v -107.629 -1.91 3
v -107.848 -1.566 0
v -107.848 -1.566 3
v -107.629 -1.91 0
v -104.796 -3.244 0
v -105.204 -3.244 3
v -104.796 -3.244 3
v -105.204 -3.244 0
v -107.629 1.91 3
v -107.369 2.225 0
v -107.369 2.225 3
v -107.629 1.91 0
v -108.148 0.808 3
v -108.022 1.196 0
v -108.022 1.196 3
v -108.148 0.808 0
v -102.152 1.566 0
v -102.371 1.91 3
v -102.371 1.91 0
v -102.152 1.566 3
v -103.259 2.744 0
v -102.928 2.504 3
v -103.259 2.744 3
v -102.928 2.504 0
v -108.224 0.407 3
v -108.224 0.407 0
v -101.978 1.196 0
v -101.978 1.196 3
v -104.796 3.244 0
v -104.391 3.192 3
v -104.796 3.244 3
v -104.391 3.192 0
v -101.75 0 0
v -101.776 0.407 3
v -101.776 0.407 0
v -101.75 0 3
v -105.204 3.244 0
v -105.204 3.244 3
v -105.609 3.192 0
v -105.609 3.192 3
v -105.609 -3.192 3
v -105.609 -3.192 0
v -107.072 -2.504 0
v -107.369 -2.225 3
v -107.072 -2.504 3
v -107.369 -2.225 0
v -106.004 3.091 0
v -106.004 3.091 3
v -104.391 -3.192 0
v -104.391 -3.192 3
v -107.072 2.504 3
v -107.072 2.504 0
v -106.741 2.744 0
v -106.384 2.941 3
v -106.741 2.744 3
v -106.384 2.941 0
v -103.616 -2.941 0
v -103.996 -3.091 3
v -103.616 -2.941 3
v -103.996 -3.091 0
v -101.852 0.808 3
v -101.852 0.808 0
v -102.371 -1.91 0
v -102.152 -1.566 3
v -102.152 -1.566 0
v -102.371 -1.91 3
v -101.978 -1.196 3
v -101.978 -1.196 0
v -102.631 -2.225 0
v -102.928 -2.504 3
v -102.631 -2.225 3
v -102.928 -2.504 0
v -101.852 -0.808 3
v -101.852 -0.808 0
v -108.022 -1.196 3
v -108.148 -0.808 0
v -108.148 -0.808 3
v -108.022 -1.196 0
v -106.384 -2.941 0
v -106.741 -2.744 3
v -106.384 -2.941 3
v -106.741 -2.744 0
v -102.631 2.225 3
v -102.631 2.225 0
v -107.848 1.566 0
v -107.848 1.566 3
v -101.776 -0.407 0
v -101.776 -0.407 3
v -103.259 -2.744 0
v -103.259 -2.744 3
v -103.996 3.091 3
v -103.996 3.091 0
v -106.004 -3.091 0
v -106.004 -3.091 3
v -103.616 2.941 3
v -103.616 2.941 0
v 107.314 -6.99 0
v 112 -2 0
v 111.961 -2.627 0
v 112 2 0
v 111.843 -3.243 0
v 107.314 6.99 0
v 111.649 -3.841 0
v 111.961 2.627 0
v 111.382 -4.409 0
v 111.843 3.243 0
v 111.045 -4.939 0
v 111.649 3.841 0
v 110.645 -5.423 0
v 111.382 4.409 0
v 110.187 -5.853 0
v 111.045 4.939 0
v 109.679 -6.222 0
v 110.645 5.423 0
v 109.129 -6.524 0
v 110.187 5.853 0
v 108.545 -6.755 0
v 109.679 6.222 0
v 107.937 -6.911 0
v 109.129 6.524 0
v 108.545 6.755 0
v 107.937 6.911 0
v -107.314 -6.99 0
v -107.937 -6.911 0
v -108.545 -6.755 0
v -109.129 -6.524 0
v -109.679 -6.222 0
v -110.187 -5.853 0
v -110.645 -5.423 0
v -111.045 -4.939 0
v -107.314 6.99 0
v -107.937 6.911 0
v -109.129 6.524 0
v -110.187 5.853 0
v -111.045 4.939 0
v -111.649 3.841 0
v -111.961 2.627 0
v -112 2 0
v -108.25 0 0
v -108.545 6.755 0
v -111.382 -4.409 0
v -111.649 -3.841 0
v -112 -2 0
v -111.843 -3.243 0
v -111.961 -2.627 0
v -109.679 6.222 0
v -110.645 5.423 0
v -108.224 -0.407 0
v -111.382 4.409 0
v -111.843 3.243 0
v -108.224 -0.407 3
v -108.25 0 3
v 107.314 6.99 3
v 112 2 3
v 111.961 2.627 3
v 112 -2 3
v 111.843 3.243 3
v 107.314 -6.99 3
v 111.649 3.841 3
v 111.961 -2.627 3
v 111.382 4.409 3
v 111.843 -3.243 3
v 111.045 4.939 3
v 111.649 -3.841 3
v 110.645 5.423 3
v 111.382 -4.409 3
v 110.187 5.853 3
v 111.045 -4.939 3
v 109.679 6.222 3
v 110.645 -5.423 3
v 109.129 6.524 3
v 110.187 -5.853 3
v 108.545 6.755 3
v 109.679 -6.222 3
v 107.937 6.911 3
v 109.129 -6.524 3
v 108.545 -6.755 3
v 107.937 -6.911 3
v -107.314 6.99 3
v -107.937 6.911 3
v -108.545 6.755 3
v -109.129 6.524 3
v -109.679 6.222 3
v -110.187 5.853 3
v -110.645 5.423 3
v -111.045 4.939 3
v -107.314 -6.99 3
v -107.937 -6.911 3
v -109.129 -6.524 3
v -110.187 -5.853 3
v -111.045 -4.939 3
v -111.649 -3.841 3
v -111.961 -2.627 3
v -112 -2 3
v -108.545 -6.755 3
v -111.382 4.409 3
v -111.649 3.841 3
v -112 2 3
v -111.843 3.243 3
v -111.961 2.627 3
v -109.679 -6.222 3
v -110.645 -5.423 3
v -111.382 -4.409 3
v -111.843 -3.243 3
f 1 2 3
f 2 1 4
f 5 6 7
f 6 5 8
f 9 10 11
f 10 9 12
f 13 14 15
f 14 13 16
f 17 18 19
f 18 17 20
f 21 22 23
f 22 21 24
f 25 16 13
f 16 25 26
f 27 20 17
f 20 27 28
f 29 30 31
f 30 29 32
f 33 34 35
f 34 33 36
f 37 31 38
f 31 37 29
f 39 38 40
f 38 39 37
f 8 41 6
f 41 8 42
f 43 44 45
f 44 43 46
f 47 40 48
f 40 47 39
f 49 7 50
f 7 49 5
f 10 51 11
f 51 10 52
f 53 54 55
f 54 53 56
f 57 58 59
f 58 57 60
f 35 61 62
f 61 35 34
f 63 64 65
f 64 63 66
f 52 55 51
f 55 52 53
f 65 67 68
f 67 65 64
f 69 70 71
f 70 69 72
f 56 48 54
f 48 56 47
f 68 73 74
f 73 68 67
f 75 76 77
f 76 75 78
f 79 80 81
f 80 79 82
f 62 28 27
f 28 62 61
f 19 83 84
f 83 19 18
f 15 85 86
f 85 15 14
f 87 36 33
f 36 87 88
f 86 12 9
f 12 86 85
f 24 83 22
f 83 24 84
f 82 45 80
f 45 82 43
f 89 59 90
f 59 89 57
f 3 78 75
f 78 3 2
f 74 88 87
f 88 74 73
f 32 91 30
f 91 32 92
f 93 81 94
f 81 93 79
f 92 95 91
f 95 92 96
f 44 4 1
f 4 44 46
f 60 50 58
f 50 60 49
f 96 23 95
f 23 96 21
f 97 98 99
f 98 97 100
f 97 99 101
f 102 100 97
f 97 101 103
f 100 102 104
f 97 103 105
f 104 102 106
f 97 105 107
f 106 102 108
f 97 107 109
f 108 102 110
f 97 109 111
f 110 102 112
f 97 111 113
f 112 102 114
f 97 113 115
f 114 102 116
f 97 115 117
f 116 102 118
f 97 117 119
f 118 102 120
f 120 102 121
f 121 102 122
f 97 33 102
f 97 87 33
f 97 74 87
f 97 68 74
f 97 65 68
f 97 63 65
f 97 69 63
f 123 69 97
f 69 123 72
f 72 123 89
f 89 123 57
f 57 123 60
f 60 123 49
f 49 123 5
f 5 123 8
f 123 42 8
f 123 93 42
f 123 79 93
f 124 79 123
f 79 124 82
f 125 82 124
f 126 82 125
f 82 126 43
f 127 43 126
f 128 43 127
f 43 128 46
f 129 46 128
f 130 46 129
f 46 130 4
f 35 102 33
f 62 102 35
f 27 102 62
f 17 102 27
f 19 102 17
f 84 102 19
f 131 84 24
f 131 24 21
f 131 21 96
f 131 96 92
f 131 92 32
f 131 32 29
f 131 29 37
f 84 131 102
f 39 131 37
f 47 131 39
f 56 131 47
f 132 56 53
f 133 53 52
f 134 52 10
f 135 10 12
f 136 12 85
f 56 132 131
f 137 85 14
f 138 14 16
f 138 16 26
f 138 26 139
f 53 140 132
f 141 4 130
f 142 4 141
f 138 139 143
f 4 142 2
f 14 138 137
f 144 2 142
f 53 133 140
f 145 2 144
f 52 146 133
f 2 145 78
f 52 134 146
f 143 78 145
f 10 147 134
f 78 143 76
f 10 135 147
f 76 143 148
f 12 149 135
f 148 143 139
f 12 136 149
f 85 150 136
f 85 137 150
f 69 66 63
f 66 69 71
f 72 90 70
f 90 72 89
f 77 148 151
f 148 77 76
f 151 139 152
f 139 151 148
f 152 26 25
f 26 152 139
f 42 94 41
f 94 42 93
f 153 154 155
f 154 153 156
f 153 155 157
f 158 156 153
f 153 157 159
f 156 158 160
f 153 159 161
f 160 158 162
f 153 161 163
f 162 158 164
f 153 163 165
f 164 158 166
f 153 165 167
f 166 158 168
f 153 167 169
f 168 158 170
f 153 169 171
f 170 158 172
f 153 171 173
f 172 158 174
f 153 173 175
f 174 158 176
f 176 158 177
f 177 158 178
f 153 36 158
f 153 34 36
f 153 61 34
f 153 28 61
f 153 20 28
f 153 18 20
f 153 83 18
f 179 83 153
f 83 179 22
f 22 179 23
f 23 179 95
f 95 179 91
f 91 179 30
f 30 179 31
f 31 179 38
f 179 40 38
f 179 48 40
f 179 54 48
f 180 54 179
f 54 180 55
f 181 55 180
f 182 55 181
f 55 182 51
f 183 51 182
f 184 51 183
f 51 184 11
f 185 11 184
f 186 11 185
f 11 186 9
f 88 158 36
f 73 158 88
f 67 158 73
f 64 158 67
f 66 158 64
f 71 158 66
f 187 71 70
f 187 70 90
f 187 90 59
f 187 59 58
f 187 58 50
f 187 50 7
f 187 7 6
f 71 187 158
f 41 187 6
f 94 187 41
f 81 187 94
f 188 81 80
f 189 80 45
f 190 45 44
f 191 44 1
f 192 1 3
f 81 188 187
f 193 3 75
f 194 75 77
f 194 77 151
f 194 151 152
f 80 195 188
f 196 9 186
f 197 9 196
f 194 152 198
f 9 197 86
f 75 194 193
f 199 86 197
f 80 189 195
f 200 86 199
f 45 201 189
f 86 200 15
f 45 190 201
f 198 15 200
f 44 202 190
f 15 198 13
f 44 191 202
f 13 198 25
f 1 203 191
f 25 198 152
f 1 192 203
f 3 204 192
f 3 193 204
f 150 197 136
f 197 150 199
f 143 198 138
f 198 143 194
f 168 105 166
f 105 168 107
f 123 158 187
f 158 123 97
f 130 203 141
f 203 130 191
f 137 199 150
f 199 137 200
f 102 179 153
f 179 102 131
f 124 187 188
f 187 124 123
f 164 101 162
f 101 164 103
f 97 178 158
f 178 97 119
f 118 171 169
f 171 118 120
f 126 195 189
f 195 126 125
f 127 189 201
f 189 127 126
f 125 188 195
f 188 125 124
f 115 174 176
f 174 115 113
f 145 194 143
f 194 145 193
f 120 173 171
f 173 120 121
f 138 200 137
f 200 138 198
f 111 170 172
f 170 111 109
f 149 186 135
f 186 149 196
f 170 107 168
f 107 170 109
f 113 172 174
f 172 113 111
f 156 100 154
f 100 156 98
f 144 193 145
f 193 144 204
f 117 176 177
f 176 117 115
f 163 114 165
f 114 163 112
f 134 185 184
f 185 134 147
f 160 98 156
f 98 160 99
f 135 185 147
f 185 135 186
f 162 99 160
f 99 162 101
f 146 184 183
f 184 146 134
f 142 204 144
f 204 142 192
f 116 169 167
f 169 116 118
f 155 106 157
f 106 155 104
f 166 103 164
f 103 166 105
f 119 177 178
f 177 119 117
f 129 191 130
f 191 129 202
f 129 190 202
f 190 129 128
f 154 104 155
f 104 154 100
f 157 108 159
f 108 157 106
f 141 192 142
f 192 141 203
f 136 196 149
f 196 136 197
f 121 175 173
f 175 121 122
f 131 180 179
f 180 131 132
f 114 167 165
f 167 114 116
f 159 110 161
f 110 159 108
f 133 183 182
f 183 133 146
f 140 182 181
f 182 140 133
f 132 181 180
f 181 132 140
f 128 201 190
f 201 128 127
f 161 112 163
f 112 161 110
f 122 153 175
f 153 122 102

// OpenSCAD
$fn = 50;


difference() {
	union() {
		hull() {
			translate(v = [-107.0000000000, 2.0000000000, 0]) {
				cylinder(h = 3, r = 5);
			}
			translate(v = [107.0000000000, 2.0000000000, 0]) {
				cylinder(h = 3, r = 5);
			}
			translate(v = [-107.0000000000, -2.0000000000, 0]) {
				cylinder(h = 3, r = 5);
			}
			translate(v = [107.0000000000, -2.0000000000, 0]) {
				cylinder(h = 3, r = 5);
			}
		}
	}
	union() {
		translate(v = [-105.0000000000, 0.0000000000, 0]) {
			cylinder(h = 3, r = 3.2500000000);
		}
		translate(v = [-105.0000000000, 0.0000000000, 0]) {
			cylinder(h = 3, r = 1.8000000000);
		}
		translate(v = [-105.0000000000, 0.0000000000, 0]) {
			cylinder(h = 3, r = 1.8000000000);
		}
		translate(v = [-105.0000000000, 0.0000000000, 0]) {
			cylinder(h = 3, r = 1.8000000000);
		}
	}
}
